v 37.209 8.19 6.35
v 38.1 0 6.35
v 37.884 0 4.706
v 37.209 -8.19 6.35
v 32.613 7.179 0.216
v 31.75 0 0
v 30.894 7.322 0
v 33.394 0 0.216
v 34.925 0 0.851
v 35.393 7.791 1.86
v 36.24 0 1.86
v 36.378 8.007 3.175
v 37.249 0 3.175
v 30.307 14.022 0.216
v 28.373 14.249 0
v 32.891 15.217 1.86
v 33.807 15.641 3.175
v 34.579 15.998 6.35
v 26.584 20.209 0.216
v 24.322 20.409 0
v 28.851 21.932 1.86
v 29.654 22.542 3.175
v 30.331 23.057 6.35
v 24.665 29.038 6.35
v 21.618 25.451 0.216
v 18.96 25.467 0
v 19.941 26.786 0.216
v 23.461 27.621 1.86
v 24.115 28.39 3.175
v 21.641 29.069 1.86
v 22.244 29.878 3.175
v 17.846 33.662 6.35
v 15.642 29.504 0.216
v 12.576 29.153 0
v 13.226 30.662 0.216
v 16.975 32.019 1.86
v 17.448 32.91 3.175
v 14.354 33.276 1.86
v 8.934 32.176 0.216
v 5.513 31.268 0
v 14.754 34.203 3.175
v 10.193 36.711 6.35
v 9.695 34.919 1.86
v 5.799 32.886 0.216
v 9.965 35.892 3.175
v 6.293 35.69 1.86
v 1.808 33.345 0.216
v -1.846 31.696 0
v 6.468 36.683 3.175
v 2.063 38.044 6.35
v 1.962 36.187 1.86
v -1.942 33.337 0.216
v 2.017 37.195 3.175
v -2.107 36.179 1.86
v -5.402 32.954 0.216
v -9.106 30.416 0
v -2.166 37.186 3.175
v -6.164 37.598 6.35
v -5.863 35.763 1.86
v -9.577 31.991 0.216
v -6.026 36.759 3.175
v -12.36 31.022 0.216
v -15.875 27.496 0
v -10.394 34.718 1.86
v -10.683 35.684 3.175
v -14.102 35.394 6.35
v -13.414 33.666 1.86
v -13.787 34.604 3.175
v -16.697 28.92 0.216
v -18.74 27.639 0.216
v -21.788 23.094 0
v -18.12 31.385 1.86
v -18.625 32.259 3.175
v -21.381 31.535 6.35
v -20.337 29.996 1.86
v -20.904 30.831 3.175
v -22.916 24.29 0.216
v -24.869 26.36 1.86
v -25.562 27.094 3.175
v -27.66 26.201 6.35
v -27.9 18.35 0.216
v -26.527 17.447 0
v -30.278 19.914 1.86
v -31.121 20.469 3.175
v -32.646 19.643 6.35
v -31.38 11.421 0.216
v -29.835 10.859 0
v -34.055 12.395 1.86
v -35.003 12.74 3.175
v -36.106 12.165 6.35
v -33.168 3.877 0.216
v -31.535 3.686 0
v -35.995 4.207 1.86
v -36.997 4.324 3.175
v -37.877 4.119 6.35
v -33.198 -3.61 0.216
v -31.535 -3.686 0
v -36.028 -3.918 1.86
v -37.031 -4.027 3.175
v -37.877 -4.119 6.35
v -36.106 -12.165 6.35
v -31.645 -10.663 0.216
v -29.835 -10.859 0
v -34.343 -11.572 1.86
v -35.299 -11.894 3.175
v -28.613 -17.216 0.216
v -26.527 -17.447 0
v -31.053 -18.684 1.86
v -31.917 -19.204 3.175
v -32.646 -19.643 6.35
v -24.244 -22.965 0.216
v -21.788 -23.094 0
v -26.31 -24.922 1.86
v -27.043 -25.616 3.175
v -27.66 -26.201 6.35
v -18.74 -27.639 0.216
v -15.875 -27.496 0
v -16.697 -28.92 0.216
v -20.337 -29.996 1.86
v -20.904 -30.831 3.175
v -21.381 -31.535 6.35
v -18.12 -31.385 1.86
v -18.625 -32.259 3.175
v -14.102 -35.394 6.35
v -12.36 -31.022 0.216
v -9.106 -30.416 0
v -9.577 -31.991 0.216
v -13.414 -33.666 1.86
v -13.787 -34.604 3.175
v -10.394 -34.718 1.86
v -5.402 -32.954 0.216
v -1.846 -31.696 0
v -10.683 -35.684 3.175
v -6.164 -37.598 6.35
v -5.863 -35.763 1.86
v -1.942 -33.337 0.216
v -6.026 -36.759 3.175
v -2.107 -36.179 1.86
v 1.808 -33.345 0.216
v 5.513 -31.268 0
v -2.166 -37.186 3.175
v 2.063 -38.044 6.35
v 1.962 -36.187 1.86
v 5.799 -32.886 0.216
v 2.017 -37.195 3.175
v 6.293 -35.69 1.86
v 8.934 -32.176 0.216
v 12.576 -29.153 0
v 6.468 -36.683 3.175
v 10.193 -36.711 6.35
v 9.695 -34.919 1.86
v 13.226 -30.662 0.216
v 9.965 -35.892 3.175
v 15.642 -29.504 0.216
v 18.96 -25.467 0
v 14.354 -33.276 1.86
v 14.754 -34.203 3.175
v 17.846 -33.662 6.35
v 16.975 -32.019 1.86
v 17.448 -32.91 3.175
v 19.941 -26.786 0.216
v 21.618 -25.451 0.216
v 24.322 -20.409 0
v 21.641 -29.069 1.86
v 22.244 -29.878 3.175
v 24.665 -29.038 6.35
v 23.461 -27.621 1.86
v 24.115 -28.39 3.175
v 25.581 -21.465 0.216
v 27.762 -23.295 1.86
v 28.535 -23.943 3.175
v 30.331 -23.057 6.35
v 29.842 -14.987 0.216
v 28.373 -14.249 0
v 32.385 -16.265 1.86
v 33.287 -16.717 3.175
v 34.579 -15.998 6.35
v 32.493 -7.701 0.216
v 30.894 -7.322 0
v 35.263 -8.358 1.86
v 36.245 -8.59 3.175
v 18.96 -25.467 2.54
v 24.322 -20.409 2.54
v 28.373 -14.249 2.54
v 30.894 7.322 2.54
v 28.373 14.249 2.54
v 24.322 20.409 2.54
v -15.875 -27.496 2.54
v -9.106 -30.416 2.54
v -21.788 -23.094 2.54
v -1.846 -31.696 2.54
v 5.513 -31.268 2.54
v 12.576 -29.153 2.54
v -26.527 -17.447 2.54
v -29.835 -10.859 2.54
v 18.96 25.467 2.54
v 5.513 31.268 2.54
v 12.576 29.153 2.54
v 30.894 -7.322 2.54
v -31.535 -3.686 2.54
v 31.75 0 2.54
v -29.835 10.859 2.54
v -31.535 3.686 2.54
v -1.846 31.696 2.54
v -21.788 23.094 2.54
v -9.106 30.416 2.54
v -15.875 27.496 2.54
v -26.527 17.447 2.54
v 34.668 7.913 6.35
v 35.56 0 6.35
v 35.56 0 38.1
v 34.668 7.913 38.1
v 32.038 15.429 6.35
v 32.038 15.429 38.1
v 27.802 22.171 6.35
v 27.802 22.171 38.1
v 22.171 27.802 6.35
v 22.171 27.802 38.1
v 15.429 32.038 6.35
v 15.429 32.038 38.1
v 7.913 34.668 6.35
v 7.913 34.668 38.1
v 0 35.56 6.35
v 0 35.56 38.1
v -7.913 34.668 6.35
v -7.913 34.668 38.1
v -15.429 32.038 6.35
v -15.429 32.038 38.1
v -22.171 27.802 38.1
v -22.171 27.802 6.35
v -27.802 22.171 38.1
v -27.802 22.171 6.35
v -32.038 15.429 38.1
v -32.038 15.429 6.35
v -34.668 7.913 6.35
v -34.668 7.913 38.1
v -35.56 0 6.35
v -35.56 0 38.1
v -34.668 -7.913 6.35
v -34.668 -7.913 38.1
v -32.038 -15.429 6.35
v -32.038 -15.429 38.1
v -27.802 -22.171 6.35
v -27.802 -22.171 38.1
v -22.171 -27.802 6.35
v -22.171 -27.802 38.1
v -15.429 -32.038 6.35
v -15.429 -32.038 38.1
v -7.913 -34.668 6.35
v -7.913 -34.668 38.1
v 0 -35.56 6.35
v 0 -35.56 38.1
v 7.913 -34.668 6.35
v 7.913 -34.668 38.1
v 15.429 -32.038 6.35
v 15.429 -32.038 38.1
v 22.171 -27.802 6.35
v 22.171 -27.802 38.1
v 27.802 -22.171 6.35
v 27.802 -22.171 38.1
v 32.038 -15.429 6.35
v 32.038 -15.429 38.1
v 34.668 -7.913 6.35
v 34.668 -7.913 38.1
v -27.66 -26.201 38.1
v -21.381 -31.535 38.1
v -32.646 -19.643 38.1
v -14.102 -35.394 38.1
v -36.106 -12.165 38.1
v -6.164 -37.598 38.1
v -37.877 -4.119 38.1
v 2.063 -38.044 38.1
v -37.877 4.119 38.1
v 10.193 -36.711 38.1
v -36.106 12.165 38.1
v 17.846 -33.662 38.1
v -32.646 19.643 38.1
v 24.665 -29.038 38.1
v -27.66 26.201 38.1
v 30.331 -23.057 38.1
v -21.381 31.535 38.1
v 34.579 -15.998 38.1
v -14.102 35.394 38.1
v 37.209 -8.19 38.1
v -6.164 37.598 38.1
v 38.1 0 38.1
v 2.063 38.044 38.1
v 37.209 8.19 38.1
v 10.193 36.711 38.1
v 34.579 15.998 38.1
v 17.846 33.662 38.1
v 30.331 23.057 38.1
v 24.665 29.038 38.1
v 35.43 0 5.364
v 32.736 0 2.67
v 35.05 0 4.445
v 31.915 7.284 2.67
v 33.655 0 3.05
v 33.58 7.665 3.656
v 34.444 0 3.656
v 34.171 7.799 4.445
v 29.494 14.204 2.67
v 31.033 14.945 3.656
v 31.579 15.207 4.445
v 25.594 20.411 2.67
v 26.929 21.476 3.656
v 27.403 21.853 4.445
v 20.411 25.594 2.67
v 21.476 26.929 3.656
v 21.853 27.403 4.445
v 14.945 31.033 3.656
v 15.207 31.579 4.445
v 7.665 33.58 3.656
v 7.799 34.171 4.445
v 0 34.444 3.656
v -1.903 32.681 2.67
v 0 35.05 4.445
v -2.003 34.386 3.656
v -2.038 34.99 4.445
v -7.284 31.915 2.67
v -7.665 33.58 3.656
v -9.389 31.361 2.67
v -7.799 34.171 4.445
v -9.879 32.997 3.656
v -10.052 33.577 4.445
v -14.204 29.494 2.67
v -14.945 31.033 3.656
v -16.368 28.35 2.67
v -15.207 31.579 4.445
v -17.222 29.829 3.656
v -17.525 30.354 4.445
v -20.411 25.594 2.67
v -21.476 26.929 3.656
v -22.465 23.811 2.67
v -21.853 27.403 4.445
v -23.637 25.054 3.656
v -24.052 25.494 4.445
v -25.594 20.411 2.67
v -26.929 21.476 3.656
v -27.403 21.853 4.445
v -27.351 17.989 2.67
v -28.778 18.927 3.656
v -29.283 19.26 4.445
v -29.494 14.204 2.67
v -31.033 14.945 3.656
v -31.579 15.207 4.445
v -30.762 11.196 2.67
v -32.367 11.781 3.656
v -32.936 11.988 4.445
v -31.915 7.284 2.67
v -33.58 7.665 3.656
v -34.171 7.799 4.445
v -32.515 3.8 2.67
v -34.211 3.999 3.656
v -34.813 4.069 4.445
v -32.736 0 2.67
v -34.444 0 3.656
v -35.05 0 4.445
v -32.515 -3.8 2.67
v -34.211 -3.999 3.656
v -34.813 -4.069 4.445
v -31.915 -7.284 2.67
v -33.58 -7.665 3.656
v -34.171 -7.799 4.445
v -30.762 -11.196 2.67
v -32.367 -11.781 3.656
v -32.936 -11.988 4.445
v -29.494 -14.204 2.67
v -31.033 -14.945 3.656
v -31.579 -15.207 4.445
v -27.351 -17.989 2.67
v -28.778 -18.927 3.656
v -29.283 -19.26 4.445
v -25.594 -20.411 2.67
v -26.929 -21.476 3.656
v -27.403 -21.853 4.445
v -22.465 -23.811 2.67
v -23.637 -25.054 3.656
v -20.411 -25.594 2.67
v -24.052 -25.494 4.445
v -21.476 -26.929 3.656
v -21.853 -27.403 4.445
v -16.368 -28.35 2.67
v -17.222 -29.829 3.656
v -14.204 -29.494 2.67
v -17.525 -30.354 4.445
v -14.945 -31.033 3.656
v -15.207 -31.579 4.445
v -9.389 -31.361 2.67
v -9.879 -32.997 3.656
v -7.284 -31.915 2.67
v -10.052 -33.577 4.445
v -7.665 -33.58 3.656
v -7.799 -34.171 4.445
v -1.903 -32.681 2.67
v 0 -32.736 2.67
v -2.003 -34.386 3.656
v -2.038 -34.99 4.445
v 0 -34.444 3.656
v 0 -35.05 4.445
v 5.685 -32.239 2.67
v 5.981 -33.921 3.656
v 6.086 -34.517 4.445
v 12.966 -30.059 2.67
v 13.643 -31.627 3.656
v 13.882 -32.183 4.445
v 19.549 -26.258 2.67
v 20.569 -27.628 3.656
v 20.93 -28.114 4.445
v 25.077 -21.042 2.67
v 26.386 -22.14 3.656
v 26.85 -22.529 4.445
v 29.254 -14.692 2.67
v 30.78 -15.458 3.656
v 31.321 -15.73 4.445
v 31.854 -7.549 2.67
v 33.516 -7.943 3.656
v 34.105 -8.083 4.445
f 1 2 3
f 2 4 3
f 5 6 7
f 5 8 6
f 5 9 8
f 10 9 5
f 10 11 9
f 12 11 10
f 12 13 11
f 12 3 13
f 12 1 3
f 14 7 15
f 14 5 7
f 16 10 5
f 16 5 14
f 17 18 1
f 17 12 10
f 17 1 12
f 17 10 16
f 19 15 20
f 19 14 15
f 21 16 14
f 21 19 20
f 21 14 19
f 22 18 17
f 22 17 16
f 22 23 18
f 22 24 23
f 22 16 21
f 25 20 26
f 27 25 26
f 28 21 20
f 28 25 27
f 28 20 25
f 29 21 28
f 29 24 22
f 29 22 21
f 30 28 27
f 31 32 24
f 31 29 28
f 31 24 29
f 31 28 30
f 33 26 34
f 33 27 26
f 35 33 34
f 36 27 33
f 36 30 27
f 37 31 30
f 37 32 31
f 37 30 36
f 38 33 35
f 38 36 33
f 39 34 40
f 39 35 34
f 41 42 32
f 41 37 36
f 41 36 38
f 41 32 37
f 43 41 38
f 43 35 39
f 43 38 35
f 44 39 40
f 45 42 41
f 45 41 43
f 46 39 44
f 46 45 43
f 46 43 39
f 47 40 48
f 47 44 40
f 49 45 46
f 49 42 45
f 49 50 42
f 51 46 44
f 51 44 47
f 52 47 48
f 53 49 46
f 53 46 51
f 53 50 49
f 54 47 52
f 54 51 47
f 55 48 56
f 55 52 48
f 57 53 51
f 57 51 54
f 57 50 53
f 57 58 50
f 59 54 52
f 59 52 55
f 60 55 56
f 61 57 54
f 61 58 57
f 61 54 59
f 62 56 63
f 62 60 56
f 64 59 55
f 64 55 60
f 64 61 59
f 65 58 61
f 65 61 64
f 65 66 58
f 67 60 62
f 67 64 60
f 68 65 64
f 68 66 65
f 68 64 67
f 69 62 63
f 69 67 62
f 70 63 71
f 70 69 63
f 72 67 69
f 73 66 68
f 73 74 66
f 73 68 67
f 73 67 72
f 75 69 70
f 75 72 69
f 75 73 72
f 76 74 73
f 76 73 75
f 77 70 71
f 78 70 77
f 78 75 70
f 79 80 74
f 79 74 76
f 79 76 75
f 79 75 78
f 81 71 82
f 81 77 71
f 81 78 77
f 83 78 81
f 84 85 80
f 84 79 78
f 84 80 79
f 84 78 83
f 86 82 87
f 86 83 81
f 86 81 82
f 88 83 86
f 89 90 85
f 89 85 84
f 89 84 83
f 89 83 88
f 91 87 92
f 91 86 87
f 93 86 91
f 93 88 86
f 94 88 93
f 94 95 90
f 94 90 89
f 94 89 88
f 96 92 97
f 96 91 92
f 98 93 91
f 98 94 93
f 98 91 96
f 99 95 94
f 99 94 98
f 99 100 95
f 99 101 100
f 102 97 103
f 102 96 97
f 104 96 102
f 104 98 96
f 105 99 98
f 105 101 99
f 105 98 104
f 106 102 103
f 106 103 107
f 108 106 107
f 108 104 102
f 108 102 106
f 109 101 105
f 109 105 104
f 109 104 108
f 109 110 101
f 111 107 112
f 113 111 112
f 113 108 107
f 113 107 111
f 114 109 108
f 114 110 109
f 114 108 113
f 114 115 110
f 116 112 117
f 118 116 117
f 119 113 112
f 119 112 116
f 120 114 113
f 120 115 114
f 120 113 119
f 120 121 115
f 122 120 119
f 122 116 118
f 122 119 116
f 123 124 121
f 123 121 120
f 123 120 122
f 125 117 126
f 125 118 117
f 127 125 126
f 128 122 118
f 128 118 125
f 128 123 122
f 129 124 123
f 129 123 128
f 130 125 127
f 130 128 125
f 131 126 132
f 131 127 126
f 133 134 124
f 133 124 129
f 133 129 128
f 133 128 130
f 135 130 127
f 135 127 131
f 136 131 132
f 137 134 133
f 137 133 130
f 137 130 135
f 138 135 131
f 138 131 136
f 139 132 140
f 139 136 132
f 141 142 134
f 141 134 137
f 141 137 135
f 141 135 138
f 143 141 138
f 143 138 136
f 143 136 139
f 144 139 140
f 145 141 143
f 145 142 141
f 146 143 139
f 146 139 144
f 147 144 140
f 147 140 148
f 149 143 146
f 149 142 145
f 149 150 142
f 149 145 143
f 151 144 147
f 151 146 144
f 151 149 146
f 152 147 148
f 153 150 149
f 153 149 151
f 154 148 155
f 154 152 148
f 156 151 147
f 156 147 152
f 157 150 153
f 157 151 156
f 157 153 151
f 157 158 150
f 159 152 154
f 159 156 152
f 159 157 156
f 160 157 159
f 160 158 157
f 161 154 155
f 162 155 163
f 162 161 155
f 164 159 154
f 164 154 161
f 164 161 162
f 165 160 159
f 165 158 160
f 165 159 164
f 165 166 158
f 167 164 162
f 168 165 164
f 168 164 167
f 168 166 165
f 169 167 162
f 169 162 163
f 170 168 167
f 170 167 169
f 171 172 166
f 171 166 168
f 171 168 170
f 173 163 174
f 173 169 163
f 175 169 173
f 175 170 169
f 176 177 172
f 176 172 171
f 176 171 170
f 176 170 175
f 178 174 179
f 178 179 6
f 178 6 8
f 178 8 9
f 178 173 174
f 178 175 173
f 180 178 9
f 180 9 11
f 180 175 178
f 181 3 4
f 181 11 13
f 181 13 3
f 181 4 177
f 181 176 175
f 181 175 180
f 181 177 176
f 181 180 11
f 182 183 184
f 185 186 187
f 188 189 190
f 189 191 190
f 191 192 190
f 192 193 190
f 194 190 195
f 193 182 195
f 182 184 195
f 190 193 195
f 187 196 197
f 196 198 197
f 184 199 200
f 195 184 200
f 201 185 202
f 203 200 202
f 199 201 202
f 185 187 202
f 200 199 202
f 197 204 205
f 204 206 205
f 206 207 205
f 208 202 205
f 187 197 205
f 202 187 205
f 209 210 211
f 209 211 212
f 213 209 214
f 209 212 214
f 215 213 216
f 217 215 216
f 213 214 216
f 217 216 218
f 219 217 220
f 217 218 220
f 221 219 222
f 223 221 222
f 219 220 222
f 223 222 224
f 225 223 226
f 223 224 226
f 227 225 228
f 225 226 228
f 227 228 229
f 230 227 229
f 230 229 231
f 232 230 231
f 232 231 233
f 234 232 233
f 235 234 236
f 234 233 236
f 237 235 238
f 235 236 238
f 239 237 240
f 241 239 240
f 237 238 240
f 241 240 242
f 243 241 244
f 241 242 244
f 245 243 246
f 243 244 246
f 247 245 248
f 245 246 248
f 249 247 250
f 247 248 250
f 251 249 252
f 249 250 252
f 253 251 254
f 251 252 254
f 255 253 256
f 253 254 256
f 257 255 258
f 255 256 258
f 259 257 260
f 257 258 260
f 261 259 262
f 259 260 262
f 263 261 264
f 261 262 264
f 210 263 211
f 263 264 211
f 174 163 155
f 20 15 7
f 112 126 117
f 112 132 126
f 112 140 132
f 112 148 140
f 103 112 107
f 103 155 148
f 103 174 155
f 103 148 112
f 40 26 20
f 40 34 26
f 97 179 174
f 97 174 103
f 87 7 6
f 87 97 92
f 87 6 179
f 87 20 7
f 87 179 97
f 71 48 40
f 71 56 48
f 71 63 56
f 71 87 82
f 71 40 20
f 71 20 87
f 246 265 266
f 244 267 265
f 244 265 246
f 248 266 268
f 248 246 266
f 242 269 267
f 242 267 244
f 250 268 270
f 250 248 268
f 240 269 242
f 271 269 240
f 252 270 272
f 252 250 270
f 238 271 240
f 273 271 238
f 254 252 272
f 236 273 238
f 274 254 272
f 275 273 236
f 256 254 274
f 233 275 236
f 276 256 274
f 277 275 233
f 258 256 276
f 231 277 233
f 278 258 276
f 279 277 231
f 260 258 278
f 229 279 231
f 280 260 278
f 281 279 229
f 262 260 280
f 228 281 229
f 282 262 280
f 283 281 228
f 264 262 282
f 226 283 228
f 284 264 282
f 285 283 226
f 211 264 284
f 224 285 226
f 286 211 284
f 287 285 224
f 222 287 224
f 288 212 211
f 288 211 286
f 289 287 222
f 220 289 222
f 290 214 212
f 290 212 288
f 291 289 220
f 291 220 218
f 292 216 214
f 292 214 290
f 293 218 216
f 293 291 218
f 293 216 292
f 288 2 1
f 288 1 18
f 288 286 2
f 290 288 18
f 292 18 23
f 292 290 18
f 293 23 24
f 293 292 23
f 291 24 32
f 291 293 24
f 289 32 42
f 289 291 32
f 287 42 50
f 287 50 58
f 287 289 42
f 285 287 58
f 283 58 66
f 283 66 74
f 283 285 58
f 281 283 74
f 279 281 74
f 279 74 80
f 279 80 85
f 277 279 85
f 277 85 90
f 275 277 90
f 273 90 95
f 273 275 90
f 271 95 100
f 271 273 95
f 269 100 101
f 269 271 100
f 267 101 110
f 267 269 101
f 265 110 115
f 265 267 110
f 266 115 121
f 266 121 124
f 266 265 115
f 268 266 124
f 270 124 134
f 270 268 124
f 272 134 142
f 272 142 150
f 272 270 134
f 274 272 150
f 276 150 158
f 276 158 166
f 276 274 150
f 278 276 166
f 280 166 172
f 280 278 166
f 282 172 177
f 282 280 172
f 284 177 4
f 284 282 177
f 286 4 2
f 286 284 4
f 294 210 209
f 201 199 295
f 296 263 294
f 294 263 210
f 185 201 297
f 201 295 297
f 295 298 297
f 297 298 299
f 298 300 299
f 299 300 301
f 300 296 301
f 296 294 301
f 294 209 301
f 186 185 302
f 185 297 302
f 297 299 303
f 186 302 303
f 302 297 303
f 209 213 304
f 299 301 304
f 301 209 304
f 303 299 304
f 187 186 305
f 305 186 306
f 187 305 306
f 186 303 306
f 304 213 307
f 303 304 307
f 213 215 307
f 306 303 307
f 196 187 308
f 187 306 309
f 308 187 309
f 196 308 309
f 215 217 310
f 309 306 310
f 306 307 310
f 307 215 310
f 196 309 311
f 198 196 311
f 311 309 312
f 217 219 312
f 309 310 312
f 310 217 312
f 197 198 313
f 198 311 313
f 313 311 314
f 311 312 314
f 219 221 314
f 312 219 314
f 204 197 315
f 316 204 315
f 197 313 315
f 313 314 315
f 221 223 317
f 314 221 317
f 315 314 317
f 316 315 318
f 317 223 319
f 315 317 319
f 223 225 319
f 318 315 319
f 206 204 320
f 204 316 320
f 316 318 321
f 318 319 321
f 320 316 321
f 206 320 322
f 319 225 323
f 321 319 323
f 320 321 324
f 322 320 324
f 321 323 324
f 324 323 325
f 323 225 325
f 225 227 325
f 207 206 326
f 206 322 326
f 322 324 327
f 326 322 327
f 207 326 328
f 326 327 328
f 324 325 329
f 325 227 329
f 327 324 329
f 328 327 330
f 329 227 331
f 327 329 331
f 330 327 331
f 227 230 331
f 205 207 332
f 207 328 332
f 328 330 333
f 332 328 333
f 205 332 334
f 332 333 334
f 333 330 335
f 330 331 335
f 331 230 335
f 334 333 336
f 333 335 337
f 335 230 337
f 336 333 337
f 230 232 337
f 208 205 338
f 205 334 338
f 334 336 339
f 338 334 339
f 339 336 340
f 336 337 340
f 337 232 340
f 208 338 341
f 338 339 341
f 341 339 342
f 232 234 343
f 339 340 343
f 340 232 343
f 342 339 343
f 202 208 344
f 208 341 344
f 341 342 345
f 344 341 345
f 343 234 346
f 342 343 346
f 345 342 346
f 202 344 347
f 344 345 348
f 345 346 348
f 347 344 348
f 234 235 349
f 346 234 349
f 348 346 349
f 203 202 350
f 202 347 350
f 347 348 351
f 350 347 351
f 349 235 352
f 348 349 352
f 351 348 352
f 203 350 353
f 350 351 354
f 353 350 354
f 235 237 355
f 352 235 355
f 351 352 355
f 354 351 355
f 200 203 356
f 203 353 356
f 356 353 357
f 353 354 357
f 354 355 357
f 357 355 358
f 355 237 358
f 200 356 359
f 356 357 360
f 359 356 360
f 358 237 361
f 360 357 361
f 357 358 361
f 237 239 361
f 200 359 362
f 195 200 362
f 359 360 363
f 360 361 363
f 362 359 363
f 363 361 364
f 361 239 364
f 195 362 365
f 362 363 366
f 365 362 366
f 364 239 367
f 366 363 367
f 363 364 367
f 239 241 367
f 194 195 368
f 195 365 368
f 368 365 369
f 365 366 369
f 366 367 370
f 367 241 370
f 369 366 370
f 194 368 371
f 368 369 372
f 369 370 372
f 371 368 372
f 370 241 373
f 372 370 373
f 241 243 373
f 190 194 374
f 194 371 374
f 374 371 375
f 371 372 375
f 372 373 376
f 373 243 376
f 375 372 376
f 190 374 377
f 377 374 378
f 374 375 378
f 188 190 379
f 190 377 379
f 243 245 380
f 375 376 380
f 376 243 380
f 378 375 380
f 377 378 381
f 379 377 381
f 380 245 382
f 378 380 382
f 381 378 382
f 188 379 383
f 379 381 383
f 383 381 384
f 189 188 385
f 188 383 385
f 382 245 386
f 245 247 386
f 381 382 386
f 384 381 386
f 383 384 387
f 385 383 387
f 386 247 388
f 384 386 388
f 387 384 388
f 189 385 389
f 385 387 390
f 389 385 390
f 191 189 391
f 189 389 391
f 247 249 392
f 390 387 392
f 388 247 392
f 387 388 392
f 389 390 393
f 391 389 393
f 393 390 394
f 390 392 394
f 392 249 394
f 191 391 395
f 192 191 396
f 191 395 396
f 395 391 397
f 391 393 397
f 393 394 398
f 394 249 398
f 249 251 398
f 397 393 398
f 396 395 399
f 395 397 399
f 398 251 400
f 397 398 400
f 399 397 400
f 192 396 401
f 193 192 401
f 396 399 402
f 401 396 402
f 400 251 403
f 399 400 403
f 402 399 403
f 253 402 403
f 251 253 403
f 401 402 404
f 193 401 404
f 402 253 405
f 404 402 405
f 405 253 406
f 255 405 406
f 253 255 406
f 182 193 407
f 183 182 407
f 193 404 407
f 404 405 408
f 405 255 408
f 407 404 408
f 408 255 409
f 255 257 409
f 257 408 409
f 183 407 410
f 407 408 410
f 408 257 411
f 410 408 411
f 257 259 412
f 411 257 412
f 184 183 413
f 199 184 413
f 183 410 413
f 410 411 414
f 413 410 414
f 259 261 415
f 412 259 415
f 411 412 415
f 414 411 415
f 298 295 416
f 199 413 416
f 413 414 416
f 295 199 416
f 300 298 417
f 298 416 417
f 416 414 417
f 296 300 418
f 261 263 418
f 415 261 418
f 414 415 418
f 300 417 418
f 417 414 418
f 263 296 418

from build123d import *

# Parameters (mm, degrees)
F2_T = -2.54


with BuildPart() as f1:
    # F0 (on Front) → F1 (revolve)
    with BuildSketch(Plane.XZ):
        with BuildLine():
            Line((0, 38.1), (0, 0))
            Line((0, 0), (31.75, 0))
            ThreePointArc((31.75, 0), (36.240128, 1.859872), (38.1, 6.35))
            Line((38.1, 6.35), (38.1, 38.1))
            Line((38.1, 38.1), (0, 38.1))
        make_face()
    revolve(axis=Axis((0, 0, 22.184535), (0, 0, 1)))

    # F2
    f2_openings = [f1.faces().sort_by_distance(p)[0] for p in [
        (0, 0, 38.1),
    ]]
    offset(amount=F2_T, openings=f2_openings)


solid = f1.part
